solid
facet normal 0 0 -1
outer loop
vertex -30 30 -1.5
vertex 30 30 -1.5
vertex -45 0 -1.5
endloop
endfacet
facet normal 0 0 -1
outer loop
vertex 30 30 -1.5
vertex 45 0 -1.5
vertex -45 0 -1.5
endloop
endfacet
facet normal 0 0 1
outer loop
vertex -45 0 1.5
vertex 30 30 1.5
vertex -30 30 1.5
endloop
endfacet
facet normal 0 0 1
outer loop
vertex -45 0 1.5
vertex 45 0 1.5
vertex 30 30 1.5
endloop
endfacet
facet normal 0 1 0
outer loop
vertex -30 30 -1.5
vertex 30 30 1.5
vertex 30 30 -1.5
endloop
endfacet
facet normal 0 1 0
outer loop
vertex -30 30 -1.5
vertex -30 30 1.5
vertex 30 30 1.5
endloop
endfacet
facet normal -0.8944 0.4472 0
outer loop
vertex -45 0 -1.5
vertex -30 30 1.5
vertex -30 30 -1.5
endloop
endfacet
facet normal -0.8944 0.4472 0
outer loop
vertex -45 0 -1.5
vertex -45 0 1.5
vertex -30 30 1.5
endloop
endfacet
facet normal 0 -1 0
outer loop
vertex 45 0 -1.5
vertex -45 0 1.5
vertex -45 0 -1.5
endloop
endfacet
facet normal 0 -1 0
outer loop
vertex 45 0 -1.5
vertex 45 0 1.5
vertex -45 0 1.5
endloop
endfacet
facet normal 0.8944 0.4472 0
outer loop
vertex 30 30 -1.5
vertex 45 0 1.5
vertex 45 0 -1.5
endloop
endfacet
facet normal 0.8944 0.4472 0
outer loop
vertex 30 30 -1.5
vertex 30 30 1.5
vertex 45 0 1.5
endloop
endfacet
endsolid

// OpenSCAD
// OpenSCAD for a "porch" extension for a Turtlebot3 burger
//           It includes a lampholder.

// This is the basic perimeter
module base() {
    linear_extrude(height=3,center=true,twist=0,convexity=10,scale=1.0) {
        polygon(points=[[-45,0],[45,0],[30,30],[-30,30],[-45,0]]);
    }
}

module lampholder() {
    difference(
        cube(30,30,3),
        cylinder(16)
    );
}

base();
lampholder();
